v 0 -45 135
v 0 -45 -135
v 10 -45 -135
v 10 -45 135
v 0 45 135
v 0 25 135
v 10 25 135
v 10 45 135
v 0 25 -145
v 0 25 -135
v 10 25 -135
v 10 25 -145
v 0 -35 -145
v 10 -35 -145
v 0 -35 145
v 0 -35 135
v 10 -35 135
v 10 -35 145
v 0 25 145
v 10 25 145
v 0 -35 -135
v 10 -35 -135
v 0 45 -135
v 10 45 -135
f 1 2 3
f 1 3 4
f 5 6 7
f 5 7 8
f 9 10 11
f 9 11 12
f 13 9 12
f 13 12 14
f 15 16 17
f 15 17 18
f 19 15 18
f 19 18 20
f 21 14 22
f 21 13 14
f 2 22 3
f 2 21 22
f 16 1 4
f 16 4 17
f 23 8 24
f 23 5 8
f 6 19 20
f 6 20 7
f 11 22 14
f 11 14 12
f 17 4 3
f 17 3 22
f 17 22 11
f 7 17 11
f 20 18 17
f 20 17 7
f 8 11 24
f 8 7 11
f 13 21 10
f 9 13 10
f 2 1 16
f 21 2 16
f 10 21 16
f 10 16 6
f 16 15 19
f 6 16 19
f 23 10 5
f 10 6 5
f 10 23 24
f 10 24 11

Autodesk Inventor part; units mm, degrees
ref_plane "YZ Plane" through (0, 0, 0) normal (1, 0, 0) x (0, 1, 0)
ref_plane "XZ Plane" through (0, 0, 0) normal (0, 1, 0) x (-1, 0, 0)
ref_plane "XY Plane" through (0, 0, 0) normal (0, 0, 1) x (1, 0, 0)
sketch "Sketch1" plane through (0, 0, 0) normal (1, 0, 0) x (0, 1, 0)
  line L0 (-45, 135) -> (45, 135)
  line L1 (45, 135) -> (45, -135)
  line L2 (45, -135) -> (-45, -135)
  line L3 (-45, -135) -> (-45, 135)
  line L4 (-45, 135) -> (45, -135) construction
  line L5 (45, 135) -> (-45, -135) construction
  point P0 (0, 0)
  dimension "d0" = 90
  dimension "d1" = 270
extrude "Extrusion1" add sketch "Sketch1" along normal blind 10
sketch "Sketch2" plane through (0, 0, 0) normal (-1, 0, 0) x (0, 0, 1)
  line L0 (-135, -45) -> (-135, 45) projected
  line L1 (135, -45) -> (-135, -45) projected
  line L2 (135, 45) -> (135, -45) projected
  line L3 (-135, 45) -> (135, 45) projected
  line L4 (0, 45) -> (0, -5)
  line L5 (145, 25) -> (-145, 25)
  line L6 (-145, 25) -> (-145, -35)
  line L7 (-145, -35) -> (145, -35)
  line L8 (145, -35) -> (145, 25)
  line L9 (145, 25) -> (-145, -35) construction
  line L10 (-145, 25) -> (145, -35) construction
  point P0 (-135, -35)
  point P1 (-135, 25)
  point P2 (135, 25)
  point P3 (135, -35)
  dimension "d8" = 90
  dimension "d9" = 50
  dimension "d10" = 60
  dimension "d11" = 290
  dimension "d12" = 270
extrude "Extrusion2" add sketch "Sketch2" against normal blind 10 contours L7 L6 L5 L0 | L2 L5 L8 L7
properties part number "03_Tam_top_vs_bottom" material "Stainless Steel, Austenitic"
